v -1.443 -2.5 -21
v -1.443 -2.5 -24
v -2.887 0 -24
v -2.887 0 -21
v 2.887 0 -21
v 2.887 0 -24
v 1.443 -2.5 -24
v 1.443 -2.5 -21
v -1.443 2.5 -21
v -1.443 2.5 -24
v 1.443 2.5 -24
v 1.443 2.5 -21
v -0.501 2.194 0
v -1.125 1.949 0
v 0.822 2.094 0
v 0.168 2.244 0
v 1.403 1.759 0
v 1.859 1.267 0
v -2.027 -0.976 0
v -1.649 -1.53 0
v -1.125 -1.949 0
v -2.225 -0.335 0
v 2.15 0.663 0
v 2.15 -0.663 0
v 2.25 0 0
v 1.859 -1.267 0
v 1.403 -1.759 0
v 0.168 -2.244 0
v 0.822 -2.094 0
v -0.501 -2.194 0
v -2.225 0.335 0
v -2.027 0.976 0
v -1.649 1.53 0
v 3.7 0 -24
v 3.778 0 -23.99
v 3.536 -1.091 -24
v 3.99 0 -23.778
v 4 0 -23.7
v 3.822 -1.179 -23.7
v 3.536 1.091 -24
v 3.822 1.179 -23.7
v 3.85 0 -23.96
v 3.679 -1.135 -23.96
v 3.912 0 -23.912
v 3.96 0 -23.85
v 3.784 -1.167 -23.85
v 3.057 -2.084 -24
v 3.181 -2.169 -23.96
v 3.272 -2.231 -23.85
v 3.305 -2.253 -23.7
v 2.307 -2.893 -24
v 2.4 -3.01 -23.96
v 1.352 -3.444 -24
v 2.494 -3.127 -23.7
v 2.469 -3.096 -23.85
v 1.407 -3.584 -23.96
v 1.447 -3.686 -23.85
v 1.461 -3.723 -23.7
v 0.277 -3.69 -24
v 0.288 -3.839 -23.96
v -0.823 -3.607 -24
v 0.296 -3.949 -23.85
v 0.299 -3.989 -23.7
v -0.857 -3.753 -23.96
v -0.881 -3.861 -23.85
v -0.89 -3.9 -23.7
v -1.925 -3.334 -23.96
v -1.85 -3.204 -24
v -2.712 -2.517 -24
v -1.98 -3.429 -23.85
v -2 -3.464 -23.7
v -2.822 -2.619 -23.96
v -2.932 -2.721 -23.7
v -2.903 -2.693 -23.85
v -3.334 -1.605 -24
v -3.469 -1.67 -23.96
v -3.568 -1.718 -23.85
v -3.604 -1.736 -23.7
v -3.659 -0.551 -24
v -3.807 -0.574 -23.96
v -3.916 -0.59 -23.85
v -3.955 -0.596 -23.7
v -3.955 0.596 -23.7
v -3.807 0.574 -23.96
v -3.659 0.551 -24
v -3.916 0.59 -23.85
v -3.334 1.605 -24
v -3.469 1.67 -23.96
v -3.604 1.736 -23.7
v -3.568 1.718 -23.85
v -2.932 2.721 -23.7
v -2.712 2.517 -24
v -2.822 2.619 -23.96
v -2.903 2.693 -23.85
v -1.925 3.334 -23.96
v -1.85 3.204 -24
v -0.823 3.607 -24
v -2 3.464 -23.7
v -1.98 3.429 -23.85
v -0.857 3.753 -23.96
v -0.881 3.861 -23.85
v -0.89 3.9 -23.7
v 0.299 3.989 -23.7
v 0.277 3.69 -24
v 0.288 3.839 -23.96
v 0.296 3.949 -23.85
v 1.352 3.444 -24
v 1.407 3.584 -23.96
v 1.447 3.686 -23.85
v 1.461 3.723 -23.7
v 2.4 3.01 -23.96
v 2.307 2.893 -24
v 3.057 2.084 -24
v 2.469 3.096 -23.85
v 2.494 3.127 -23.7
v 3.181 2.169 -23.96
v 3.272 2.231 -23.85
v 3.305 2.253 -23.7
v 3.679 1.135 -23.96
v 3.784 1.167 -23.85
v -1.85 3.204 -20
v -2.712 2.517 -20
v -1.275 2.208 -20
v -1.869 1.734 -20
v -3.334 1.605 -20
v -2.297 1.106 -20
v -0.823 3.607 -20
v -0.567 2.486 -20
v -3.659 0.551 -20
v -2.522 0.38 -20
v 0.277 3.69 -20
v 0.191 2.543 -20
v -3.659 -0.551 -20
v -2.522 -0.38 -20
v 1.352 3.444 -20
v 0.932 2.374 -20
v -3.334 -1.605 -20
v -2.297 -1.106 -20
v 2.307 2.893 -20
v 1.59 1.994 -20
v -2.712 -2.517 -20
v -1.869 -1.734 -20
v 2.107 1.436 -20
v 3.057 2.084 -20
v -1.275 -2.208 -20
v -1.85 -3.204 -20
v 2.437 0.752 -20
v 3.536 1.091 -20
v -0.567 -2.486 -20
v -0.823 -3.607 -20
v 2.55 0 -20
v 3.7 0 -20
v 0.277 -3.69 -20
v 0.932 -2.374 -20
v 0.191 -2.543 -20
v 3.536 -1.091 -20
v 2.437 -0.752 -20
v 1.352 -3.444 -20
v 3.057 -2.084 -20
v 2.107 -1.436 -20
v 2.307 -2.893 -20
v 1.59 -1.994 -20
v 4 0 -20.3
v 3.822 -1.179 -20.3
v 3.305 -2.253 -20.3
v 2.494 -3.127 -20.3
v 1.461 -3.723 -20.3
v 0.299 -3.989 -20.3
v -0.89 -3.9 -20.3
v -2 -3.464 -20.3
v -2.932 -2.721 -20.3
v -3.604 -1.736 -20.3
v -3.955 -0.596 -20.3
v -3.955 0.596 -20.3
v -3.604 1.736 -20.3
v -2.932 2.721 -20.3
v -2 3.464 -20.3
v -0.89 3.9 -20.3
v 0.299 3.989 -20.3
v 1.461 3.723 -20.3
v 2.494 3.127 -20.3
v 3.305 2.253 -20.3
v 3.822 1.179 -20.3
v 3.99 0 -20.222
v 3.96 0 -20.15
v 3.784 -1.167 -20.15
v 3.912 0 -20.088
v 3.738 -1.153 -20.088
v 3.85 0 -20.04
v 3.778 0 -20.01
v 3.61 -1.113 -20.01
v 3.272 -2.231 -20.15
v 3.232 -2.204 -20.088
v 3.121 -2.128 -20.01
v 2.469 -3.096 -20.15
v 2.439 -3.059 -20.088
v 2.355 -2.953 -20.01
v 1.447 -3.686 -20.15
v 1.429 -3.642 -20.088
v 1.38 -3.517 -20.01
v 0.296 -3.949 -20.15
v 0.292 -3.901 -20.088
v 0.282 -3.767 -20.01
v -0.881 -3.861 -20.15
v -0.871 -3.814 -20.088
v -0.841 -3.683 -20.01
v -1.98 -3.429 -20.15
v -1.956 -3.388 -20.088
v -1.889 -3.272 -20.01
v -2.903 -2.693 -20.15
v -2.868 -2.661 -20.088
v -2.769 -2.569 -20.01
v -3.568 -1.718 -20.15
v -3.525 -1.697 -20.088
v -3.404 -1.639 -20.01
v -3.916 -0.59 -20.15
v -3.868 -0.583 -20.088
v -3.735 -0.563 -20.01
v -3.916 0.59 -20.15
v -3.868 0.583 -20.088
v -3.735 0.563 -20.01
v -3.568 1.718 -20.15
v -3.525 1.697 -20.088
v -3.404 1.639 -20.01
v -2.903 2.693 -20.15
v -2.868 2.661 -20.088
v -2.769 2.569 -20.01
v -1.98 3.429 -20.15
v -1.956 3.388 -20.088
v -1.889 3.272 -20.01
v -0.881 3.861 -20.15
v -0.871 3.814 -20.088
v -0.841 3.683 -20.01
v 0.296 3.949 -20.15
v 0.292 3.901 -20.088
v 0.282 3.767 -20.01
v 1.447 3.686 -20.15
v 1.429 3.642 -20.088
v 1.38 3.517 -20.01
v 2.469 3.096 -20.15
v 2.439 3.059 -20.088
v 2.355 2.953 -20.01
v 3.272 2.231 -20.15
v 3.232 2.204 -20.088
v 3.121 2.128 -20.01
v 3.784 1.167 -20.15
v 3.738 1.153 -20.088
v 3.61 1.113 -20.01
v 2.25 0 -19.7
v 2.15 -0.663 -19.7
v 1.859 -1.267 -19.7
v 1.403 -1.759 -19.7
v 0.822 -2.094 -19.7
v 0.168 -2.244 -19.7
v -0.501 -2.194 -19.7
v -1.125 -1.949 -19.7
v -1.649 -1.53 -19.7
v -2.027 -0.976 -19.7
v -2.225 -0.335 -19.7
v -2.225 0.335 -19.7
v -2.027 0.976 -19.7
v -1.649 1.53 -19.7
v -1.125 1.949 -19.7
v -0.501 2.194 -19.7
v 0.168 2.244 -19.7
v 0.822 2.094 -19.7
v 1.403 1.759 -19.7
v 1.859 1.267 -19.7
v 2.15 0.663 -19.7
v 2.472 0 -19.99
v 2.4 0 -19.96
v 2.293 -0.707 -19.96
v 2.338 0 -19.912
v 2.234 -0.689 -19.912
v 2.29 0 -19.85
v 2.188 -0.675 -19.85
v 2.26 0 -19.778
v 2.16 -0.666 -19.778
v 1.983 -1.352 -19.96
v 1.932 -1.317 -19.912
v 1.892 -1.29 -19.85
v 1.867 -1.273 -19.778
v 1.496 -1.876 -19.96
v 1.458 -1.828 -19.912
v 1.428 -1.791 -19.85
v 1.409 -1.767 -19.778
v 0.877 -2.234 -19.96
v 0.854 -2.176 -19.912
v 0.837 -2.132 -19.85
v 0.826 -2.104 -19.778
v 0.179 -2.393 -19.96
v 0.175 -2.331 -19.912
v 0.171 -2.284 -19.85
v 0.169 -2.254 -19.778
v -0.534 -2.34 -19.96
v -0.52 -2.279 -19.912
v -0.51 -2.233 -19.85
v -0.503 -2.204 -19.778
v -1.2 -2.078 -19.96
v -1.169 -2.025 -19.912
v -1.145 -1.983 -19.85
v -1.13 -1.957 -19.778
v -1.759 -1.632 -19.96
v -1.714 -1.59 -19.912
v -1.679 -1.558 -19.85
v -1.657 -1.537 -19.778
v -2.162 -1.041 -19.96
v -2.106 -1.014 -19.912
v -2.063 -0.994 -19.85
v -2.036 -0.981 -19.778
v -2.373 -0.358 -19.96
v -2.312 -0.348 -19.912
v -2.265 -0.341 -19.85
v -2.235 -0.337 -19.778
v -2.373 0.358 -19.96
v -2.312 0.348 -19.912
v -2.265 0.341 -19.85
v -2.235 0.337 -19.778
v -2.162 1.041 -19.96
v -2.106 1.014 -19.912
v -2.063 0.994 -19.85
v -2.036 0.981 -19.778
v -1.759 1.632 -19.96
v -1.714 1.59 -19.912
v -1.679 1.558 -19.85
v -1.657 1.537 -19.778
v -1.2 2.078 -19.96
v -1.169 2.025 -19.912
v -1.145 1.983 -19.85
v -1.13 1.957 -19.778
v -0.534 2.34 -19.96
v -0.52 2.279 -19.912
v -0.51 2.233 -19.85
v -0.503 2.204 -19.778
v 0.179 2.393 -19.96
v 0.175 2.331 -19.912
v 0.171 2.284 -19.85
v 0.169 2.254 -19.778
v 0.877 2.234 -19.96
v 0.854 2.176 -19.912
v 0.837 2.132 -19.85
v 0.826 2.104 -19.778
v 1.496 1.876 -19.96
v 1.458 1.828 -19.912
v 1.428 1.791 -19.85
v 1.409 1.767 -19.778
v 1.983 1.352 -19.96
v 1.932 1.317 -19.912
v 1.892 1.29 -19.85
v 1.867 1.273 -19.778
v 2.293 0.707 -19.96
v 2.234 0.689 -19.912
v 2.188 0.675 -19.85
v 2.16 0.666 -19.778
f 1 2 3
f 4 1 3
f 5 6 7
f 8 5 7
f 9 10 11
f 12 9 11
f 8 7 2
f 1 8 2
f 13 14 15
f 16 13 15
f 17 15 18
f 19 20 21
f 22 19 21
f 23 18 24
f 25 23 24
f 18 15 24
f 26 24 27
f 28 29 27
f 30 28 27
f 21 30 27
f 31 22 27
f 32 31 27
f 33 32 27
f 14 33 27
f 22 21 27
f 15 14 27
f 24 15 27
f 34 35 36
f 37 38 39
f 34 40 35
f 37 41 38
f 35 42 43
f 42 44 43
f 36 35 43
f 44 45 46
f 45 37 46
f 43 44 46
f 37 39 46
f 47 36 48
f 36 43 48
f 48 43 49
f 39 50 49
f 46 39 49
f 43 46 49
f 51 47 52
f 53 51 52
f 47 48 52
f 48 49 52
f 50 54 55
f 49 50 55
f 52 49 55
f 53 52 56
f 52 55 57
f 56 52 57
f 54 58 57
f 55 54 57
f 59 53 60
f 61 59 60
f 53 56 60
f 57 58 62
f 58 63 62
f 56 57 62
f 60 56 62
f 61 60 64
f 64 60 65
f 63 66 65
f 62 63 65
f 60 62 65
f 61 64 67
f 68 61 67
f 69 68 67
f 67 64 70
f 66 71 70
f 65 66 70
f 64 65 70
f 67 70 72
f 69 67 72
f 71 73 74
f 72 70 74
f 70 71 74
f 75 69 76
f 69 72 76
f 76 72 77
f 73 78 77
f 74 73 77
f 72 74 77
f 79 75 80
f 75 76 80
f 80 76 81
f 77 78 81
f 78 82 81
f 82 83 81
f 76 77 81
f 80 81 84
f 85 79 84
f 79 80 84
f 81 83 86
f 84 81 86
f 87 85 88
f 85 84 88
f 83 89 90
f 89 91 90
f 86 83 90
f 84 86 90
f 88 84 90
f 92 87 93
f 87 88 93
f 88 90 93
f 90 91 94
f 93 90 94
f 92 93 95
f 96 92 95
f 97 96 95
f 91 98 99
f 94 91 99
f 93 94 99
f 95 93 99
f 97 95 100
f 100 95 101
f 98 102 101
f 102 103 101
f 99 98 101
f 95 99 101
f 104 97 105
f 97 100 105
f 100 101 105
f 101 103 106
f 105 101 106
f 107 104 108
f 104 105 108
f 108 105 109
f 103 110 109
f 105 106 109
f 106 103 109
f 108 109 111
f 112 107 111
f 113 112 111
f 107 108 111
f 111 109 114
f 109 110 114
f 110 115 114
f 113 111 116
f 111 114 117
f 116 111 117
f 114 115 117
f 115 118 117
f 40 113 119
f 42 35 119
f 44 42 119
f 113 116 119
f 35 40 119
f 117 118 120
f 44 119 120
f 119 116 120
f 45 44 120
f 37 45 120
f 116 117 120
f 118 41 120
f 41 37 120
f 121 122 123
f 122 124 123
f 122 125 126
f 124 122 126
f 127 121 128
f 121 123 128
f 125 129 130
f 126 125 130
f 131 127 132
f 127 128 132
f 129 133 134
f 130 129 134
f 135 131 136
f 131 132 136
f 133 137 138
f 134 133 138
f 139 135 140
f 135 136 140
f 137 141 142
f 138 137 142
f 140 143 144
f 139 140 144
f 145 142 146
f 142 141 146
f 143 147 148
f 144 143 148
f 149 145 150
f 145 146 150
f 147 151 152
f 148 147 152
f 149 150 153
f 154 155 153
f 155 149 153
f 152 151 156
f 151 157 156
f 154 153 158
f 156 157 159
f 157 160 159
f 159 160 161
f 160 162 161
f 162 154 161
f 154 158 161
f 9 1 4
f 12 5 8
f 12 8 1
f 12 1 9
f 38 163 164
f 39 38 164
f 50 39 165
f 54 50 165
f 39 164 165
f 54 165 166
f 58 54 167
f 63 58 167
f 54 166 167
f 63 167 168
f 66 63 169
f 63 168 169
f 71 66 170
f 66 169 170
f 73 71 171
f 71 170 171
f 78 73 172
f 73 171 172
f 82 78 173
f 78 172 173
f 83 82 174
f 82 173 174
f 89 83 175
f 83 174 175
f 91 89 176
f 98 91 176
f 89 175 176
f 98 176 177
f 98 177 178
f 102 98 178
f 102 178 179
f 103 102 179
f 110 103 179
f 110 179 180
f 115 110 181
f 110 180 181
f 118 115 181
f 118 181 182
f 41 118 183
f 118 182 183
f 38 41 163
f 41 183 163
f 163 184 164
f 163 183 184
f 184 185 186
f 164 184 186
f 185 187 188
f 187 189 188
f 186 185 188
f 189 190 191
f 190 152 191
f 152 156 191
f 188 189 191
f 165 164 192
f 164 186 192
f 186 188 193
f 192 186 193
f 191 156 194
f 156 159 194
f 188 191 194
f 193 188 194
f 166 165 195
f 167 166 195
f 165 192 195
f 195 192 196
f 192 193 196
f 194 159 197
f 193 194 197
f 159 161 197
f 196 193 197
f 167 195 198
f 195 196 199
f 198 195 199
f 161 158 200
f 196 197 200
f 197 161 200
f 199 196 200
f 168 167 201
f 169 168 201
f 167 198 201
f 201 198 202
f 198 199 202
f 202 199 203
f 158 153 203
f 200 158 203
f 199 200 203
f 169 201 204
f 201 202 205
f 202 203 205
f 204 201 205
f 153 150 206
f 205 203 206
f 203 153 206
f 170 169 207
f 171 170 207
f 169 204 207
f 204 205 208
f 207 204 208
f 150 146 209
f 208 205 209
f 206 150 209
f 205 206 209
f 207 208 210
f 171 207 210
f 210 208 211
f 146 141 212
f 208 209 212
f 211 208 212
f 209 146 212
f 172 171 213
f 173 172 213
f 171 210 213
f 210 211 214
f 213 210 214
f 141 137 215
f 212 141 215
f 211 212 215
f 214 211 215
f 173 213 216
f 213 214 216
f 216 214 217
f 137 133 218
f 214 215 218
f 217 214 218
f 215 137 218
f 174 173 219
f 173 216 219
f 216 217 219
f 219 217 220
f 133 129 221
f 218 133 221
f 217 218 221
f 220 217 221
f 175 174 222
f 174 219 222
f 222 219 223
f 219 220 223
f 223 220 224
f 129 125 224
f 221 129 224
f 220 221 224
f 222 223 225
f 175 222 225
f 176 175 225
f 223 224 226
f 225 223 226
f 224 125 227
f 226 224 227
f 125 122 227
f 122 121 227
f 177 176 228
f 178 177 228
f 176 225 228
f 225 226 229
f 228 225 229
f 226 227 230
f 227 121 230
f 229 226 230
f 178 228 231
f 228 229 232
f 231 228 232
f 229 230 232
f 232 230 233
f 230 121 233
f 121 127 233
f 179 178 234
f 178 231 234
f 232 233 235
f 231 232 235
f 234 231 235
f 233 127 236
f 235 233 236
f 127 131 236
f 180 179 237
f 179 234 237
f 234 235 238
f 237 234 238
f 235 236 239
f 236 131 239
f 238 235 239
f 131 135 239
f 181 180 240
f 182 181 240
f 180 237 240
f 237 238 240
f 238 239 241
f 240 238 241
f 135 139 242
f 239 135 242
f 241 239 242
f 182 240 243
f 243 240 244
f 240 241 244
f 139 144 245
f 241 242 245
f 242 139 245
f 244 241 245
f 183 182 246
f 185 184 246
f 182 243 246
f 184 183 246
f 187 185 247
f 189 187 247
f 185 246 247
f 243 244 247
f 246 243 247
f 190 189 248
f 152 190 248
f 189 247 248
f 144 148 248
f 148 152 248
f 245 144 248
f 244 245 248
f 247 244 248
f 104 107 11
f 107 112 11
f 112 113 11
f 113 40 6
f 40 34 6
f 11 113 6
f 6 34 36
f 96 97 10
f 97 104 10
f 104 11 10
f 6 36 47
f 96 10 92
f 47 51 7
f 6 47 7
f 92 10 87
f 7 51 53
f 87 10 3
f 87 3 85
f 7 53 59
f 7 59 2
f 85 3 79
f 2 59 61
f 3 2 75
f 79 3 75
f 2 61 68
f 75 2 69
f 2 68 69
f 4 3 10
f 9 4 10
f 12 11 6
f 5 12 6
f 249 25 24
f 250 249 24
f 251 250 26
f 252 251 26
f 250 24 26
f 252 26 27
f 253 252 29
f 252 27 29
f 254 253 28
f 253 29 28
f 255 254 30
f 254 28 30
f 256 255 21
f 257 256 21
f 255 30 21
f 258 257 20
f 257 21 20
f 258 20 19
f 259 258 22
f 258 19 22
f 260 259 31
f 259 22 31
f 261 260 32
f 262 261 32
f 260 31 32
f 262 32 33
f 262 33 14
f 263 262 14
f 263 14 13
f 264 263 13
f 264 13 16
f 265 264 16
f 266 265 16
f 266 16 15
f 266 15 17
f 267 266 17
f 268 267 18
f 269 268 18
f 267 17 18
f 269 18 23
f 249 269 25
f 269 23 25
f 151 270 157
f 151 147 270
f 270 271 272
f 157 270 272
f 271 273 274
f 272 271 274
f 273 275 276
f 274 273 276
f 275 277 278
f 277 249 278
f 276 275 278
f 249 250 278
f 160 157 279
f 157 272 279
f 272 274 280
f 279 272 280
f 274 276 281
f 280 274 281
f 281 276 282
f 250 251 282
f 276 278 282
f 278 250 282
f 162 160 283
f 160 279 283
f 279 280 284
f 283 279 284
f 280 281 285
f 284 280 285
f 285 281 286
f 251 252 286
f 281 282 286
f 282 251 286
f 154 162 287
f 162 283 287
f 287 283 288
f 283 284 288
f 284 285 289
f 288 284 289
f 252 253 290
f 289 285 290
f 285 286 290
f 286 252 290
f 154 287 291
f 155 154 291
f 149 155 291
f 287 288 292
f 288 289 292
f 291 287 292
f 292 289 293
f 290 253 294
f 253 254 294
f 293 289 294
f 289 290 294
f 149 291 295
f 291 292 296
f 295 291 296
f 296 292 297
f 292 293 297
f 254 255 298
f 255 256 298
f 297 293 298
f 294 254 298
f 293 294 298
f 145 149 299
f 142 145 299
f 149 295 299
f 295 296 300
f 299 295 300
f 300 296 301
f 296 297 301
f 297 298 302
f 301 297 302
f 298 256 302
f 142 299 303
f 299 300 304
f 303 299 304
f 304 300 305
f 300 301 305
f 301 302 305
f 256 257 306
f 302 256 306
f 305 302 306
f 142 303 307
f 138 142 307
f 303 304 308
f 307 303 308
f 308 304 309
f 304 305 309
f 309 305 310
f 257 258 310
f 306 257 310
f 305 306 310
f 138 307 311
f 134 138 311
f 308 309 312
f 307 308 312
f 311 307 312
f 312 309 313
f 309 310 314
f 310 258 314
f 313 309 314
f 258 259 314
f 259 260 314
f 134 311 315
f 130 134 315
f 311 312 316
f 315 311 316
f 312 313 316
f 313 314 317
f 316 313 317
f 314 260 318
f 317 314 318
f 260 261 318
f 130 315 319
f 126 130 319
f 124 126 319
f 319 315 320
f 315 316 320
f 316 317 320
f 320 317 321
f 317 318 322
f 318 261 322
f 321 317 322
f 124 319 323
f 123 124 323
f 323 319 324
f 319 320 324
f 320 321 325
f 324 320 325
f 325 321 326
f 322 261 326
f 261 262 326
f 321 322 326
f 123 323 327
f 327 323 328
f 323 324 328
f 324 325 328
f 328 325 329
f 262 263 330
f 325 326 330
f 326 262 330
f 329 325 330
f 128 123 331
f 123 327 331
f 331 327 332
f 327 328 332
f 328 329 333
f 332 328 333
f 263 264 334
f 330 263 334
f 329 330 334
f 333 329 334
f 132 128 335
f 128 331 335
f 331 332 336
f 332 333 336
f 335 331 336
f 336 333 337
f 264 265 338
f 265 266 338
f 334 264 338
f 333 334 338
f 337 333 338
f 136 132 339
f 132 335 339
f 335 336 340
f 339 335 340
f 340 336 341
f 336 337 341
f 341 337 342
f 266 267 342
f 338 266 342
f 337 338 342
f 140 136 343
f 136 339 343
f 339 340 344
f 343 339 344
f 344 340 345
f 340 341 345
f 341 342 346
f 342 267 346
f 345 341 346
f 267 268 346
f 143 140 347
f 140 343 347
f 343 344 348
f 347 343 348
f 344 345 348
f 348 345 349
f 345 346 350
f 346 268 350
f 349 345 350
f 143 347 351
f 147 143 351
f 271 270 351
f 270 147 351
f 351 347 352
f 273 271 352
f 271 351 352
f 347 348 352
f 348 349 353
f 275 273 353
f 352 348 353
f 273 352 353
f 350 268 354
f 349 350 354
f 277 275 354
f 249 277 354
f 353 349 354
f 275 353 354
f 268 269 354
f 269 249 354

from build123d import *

# Parameters (mm, degrees)
SCHNITT_LINEAR_AUSTRAGEN1_DEPTH = 3
VERRUNDUNG1_R                   = 0.3
KREISMUSTER1_COUNT              = 2
KREISMUSTER1_ANGLE              = 90


with BuildPart() as part:
    # Skizze1 → Rotation1 (revolve)
    with BuildSketch(Plane(origin=(0, 0, 0), x_dir=(0, 0, -1), z_dir=(0, 1, 0))):
        Polygon((0, 0), (0, 24), (4, 24), (4, 20), (2.25, 20), (2.25, 0), align=None)
    revolve(axis=Axis((0, 0, 0), (-1, 0, 0)))

    # Skizze2 → Schnitt-Linear austragen1 (cut)
    with BuildSketch(Plane(origin=(-24, 0, 0), x_dir=(0, 1, 0), z_dir=(-1, 0, 0))):
        Polygon((0, 2.886751346), (-2.5, 1.443375673), (-2.5, -1.443375673), (0, -2.886751346), (2.5, -1.443375673), (2.5, 1.443375673), align=None)
    extrude(amount=-SCHNITT_LINEAR_AUSTRAGEN1_DEPTH, mode=Mode.SUBTRACT)

    # Verrundung1
    verrundung1_edges = [part.edges().sort_by_distance(p)[0] for p in [
        (-20, 0, 2.25),
        (-20, 0, 4),
        (-24, 0, 4),
    ]]
    fillet(verrundung1_edges, radius=VERRUNDUNG1_R)


with BuildPart() as kreismuster1_1:
    # Kreismuster1: pattern copy
    add(part.part.rotate(Axis((0, 0, 0), (0, -1, 0)), 1 * KREISMUSTER1_ANGLE / (KREISMUSTER1_COUNT - 1)))


solid = kreismuster1_1.part
